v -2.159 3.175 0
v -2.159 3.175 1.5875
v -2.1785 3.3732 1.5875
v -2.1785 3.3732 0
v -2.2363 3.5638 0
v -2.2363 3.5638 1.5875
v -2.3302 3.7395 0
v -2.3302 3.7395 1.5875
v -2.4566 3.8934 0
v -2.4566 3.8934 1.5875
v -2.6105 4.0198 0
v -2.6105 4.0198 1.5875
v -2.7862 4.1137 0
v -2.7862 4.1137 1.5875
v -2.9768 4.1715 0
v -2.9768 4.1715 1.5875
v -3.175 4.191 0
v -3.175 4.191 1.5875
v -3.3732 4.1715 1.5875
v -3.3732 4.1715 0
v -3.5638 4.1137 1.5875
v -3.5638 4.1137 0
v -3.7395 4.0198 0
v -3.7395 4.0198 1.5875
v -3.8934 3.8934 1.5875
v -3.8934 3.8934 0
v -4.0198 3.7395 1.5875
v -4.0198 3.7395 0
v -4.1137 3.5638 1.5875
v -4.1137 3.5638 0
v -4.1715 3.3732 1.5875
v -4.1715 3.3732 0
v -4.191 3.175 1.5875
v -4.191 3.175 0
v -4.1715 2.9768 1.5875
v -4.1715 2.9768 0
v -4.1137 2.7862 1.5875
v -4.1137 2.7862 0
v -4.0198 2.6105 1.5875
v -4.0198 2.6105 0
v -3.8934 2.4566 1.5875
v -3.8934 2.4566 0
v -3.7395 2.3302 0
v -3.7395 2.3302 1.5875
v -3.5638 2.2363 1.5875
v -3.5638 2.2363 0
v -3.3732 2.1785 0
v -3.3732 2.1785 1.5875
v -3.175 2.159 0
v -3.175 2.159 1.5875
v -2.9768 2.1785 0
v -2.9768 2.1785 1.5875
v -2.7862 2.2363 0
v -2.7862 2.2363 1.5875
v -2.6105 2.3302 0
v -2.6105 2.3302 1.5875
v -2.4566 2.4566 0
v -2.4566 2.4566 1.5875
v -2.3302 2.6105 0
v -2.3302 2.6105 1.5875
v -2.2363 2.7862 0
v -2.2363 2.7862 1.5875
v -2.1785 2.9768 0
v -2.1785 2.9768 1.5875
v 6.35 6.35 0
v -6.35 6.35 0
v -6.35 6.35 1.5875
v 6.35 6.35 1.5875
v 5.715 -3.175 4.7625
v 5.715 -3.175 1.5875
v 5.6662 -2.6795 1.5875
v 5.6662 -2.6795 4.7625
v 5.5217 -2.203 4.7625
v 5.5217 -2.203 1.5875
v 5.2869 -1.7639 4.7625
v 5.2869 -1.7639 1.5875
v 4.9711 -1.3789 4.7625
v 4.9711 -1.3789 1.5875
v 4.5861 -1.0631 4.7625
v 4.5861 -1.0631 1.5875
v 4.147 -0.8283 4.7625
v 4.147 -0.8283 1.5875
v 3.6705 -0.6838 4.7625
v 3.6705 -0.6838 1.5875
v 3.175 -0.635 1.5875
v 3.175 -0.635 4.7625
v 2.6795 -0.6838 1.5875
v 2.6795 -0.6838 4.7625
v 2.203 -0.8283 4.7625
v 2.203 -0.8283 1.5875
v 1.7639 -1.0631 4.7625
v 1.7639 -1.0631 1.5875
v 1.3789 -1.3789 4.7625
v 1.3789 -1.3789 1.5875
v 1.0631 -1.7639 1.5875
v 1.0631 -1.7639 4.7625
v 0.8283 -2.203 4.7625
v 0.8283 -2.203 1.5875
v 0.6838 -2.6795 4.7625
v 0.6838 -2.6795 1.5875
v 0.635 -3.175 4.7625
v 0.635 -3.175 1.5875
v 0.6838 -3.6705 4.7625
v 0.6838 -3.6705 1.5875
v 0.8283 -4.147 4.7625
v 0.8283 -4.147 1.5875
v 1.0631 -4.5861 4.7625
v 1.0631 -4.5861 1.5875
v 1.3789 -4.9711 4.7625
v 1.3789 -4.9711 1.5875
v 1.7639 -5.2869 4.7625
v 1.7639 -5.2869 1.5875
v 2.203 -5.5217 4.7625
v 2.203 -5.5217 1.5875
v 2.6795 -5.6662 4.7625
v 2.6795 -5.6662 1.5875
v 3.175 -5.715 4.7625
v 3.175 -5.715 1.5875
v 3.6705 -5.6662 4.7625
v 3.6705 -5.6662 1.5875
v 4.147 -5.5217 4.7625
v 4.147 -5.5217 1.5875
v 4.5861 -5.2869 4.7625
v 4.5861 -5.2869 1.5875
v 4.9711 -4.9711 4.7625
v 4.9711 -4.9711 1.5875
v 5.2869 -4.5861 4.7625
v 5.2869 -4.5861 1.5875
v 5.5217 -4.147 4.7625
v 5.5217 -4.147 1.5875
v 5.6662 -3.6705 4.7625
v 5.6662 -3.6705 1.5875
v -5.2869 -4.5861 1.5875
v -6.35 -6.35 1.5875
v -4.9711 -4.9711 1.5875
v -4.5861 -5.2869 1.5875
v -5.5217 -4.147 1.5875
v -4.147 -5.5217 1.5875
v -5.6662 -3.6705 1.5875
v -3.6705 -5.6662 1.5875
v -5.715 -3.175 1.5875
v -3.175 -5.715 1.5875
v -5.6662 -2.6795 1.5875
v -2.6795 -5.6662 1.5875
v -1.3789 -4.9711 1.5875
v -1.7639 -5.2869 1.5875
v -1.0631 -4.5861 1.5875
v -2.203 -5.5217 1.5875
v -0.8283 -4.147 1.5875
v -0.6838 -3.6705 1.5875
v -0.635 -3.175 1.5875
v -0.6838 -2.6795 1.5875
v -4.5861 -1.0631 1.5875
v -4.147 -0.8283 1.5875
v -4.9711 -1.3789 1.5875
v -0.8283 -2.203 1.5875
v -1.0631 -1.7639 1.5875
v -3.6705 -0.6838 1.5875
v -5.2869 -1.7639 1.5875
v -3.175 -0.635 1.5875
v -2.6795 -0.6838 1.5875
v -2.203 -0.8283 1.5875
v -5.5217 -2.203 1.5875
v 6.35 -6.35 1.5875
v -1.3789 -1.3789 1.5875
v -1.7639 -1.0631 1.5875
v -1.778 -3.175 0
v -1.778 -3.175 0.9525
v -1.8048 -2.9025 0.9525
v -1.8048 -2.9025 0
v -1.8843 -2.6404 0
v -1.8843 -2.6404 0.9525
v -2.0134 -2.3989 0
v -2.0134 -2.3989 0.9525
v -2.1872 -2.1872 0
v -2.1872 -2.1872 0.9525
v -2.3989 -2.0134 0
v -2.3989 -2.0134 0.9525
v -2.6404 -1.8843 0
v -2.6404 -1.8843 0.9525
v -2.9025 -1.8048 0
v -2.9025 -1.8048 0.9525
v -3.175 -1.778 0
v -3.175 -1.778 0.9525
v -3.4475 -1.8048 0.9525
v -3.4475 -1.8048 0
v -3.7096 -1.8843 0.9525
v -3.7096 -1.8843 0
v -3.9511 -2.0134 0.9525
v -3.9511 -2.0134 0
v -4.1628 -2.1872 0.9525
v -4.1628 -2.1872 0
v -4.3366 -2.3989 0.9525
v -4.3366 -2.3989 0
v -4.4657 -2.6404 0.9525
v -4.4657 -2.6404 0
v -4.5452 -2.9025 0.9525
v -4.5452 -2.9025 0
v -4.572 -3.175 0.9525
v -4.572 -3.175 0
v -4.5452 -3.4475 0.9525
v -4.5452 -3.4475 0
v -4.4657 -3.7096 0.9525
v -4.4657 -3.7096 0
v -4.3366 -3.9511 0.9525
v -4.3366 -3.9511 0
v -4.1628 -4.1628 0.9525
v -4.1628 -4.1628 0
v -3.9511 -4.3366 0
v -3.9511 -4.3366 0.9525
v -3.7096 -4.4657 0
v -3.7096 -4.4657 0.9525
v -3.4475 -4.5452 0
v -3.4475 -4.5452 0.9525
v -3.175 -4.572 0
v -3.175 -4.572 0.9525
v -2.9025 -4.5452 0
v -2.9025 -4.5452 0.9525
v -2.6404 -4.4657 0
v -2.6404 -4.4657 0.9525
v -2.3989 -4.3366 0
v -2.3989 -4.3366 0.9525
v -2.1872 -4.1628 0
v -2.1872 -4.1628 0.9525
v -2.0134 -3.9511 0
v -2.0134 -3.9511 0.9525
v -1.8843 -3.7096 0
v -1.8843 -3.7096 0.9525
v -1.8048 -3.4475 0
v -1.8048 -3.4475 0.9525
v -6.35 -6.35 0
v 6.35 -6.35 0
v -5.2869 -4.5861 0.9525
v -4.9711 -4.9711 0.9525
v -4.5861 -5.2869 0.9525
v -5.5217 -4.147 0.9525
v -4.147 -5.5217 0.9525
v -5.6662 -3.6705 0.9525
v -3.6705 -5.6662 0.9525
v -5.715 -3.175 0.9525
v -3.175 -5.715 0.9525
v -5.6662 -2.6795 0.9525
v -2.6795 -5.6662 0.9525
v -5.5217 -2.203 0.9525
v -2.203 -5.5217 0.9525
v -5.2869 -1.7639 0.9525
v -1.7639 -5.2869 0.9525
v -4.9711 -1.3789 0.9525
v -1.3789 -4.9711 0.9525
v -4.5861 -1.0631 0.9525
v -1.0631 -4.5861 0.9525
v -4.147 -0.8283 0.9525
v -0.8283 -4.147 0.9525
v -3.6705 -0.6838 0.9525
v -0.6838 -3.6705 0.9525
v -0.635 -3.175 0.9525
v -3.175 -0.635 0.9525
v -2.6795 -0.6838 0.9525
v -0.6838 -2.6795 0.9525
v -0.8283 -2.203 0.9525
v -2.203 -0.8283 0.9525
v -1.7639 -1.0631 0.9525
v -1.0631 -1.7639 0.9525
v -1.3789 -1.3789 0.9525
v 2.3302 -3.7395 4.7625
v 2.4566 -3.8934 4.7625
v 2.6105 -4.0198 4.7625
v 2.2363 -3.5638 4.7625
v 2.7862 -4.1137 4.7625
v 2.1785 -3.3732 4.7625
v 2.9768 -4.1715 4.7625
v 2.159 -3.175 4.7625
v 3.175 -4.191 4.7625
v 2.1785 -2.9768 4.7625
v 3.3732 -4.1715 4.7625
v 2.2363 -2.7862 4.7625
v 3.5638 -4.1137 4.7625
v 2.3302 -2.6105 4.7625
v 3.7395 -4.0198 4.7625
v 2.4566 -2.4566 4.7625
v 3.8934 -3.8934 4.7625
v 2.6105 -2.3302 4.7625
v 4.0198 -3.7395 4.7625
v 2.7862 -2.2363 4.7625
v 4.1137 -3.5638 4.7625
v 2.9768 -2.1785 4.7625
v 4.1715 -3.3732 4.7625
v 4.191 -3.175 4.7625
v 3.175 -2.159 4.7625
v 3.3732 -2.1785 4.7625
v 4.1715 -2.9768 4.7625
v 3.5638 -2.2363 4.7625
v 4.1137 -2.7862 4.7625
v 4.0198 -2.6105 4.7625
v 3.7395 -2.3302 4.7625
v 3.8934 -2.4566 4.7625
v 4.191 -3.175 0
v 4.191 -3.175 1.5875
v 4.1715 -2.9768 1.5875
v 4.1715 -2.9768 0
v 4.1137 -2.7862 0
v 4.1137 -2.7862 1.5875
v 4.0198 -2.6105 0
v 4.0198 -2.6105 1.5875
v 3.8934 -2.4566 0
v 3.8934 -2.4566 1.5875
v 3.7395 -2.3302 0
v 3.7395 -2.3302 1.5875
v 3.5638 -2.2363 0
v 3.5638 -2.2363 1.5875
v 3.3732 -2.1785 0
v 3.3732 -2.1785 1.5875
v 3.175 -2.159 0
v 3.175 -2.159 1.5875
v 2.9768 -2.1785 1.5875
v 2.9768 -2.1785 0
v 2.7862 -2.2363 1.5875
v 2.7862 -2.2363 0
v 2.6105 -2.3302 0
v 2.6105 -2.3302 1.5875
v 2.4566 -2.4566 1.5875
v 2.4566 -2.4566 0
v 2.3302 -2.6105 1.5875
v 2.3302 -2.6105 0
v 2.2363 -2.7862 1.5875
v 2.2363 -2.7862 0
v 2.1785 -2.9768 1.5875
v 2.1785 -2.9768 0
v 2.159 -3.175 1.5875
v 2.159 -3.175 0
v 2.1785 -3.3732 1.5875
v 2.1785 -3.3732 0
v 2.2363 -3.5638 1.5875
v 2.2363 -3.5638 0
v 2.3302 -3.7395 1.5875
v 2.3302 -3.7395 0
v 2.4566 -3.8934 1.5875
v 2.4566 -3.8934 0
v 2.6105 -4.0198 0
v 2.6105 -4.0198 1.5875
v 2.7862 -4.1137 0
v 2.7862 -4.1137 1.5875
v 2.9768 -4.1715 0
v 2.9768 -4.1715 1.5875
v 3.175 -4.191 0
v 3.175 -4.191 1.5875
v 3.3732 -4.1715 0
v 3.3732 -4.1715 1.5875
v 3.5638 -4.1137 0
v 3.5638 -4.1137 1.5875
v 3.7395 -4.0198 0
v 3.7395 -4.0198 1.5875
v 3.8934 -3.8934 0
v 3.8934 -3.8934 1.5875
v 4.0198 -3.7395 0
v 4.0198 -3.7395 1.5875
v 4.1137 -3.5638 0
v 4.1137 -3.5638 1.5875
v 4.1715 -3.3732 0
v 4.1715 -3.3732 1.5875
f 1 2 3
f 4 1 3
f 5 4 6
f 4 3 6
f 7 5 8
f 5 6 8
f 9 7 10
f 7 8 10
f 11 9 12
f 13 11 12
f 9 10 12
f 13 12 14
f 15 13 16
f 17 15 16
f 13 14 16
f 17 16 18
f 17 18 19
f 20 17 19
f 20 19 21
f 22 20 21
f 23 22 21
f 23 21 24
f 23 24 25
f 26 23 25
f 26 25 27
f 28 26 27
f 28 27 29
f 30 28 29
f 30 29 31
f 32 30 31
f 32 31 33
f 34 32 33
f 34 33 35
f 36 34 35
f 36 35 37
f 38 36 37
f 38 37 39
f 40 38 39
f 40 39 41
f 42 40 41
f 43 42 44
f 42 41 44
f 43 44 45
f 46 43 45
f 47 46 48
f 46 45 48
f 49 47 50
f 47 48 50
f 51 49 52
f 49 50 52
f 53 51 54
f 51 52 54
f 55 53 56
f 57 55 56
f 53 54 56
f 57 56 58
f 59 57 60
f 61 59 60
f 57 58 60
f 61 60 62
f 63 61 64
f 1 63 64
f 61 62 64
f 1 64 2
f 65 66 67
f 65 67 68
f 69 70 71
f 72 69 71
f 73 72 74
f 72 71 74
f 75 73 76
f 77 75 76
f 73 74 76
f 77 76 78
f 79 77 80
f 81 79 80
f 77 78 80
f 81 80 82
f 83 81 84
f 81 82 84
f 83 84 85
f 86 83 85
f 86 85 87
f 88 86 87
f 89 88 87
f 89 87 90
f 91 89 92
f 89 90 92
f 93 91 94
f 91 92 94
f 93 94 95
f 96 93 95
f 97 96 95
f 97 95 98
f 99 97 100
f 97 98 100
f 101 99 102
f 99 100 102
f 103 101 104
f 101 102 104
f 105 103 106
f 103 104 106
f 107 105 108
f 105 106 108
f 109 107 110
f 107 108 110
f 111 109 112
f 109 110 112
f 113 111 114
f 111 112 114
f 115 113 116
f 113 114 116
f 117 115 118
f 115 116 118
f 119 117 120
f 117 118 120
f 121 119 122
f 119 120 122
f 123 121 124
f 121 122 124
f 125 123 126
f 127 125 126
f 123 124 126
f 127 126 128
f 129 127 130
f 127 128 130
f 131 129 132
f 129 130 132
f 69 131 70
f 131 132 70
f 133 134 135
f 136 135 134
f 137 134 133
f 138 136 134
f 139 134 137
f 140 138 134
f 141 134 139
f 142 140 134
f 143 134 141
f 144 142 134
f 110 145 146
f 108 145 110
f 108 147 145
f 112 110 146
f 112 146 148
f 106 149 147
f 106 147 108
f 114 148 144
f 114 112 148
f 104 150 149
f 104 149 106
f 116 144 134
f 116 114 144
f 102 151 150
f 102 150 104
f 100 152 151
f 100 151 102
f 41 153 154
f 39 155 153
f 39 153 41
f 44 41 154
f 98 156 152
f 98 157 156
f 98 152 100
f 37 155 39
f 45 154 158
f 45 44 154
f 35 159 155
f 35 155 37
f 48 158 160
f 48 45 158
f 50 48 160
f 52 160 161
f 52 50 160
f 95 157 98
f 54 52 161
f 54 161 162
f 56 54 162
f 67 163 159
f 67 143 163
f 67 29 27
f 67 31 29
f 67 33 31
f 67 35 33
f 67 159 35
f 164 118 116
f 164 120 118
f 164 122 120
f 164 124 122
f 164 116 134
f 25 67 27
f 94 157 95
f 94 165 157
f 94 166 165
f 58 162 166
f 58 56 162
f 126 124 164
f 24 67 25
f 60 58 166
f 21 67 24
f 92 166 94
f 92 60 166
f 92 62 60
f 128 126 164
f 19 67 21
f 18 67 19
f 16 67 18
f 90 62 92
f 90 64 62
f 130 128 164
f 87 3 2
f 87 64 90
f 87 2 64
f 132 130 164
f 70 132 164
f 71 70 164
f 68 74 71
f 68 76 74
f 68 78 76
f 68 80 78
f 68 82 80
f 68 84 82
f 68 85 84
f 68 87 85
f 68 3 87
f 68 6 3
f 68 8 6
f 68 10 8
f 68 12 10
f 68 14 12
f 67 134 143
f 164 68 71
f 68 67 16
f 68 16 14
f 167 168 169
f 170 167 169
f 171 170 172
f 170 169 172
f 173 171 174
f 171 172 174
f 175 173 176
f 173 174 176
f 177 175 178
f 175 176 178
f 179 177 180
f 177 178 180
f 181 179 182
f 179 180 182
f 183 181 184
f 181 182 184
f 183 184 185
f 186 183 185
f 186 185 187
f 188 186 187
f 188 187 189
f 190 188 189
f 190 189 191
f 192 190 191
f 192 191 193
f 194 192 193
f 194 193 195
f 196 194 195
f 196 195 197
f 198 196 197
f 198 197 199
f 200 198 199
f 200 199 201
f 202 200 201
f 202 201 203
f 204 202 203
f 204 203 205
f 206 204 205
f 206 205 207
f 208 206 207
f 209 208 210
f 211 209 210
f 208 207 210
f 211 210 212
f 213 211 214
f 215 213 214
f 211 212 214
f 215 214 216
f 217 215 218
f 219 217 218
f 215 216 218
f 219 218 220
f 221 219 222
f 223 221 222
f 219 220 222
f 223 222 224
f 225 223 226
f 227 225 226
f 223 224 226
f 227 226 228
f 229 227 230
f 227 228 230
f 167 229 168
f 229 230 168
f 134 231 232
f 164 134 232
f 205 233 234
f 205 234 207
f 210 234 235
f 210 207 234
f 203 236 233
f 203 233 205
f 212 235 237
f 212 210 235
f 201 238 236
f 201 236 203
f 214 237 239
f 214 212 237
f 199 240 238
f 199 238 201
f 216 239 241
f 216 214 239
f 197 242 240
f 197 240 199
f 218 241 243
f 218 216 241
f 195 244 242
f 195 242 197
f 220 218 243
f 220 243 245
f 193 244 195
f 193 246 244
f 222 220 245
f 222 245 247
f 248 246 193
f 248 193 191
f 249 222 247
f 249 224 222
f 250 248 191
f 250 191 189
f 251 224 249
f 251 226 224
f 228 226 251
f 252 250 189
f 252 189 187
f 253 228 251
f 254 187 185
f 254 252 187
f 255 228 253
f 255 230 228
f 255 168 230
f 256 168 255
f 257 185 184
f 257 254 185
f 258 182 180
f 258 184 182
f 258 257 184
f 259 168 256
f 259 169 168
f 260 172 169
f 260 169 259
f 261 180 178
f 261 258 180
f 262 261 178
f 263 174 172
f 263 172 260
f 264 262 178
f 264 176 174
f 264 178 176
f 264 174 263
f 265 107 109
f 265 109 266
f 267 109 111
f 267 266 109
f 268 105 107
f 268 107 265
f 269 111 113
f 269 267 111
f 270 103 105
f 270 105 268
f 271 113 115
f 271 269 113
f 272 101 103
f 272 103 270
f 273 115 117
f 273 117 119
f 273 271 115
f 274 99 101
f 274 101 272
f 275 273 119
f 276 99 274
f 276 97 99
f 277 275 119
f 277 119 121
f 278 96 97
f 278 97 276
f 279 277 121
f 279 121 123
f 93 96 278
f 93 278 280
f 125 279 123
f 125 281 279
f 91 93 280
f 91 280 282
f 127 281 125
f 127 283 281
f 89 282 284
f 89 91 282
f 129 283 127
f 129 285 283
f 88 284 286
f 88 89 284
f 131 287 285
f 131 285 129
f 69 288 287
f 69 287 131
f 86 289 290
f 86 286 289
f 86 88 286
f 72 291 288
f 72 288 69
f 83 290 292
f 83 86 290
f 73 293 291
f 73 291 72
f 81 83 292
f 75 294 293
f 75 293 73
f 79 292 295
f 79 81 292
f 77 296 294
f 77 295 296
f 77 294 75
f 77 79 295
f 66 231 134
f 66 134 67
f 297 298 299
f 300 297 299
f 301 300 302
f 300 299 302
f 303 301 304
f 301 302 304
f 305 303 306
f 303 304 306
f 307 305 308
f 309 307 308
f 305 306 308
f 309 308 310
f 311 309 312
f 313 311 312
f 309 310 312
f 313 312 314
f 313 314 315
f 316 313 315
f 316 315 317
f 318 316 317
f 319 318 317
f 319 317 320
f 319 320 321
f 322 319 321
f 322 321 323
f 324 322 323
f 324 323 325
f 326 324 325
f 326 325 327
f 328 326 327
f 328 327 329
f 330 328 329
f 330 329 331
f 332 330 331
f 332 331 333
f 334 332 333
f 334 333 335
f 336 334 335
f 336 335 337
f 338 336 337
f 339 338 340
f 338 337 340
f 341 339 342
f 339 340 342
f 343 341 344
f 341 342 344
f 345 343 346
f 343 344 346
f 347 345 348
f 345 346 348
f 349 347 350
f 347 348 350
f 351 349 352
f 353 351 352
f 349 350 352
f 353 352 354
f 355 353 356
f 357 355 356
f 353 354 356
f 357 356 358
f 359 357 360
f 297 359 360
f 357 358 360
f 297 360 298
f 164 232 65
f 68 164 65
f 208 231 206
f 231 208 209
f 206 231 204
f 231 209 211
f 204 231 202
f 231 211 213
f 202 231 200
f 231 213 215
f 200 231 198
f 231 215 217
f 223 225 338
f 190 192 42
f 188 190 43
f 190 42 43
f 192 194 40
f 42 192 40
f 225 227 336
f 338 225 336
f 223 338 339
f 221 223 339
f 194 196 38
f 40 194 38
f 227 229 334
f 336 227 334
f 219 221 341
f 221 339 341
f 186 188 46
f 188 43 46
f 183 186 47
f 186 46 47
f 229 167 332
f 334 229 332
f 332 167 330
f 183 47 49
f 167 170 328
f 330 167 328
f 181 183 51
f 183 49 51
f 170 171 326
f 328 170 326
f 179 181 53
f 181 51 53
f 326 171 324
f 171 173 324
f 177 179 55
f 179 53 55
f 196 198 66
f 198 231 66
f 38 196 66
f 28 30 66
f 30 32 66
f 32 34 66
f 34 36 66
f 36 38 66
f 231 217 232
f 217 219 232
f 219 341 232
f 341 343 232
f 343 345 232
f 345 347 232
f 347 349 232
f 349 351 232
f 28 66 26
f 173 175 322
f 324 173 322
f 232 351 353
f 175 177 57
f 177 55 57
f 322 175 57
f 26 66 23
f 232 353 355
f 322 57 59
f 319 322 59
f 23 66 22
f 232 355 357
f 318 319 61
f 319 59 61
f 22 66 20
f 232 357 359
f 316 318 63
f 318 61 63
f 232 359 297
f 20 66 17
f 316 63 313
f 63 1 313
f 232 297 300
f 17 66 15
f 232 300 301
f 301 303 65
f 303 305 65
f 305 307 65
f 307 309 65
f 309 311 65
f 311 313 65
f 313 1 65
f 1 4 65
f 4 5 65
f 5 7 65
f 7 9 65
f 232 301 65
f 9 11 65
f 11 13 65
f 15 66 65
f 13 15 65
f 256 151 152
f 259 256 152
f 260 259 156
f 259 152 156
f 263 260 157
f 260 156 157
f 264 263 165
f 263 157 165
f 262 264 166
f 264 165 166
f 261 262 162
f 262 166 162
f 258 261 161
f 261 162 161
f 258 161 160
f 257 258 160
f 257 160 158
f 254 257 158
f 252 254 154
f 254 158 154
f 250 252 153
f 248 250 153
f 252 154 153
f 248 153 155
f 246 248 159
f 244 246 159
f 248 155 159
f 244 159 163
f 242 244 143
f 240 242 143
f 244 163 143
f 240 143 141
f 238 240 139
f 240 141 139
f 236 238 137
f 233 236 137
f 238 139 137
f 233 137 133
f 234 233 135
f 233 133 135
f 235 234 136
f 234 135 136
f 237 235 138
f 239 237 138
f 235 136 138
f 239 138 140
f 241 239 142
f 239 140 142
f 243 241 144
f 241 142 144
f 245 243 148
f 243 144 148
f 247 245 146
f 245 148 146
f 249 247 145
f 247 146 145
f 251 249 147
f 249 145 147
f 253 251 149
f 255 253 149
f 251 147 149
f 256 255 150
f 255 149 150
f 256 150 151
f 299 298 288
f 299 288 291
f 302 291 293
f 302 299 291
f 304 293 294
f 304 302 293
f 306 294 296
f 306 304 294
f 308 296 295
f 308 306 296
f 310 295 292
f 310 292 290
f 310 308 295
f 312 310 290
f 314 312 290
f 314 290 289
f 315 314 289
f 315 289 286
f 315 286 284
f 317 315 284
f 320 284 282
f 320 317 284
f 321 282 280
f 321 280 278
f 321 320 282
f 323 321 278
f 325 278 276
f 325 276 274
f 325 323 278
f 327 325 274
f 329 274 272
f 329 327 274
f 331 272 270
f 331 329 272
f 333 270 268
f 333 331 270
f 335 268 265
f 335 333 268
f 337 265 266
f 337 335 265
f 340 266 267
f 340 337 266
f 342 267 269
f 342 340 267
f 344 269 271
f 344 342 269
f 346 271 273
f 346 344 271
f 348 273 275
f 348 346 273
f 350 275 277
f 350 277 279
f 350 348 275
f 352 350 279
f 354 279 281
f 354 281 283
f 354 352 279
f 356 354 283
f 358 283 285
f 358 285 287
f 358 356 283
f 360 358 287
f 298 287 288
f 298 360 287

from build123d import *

# Parameters (mm, degrees)
F0_W     = 12.7
F0_H     = 12.7
F1_DEPTH = 1.5875
F2_R     = 1.016
F2_R_2   = 1.397
F3_DEPTH = 6.35
F2_R_3   = 2.54
F4_DEPTH = 3.175
F5_DEPTH = 0.635


with BuildPart() as f1:
    # F0 (on Top) → F1 (new body)
    with BuildSketch(Plane.XY):
        Rectangle(F0_W, F0_H)
    extrude(amount=F1_DEPTH)

    # F2 (on face) → F3 (cut)
    with BuildSketch(Plane.XY.offset(1.5875)):
        with Locations((-3.175, 3.175)):
            Circle(F2_R)
        with Locations((3.175, -3.175)):
            Circle(F2_R)
        with Locations((-3.175, -3.175)):
            Circle(F2_R_2)
    extrude(amount=-F3_DEPTH, mode=Mode.SUBTRACT)

    # F2 (on face) → F4 (join)
    with BuildSketch(Plane.XY.offset(1.5875)):
        with Locations((3.175, -3.175)):
            Circle(F2_R_3)
        with Locations((3.175, -3.175)):
            Circle(F2_R, mode=Mode.SUBTRACT)
    extrude(amount=F4_DEPTH)

    # F2 (on face) → F5 (cut)
    with BuildSketch(Plane.XY.offset(1.5875)):
        with Locations((-3.175, -3.175)):
            Circle(F2_R_3)
        with Locations((-3.175, -3.175)):
            Circle(F2_R_2, mode=Mode.SUBTRACT)
    extrude(amount=-F5_DEPTH, mode=Mode.SUBTRACT)


solid = f1.part
